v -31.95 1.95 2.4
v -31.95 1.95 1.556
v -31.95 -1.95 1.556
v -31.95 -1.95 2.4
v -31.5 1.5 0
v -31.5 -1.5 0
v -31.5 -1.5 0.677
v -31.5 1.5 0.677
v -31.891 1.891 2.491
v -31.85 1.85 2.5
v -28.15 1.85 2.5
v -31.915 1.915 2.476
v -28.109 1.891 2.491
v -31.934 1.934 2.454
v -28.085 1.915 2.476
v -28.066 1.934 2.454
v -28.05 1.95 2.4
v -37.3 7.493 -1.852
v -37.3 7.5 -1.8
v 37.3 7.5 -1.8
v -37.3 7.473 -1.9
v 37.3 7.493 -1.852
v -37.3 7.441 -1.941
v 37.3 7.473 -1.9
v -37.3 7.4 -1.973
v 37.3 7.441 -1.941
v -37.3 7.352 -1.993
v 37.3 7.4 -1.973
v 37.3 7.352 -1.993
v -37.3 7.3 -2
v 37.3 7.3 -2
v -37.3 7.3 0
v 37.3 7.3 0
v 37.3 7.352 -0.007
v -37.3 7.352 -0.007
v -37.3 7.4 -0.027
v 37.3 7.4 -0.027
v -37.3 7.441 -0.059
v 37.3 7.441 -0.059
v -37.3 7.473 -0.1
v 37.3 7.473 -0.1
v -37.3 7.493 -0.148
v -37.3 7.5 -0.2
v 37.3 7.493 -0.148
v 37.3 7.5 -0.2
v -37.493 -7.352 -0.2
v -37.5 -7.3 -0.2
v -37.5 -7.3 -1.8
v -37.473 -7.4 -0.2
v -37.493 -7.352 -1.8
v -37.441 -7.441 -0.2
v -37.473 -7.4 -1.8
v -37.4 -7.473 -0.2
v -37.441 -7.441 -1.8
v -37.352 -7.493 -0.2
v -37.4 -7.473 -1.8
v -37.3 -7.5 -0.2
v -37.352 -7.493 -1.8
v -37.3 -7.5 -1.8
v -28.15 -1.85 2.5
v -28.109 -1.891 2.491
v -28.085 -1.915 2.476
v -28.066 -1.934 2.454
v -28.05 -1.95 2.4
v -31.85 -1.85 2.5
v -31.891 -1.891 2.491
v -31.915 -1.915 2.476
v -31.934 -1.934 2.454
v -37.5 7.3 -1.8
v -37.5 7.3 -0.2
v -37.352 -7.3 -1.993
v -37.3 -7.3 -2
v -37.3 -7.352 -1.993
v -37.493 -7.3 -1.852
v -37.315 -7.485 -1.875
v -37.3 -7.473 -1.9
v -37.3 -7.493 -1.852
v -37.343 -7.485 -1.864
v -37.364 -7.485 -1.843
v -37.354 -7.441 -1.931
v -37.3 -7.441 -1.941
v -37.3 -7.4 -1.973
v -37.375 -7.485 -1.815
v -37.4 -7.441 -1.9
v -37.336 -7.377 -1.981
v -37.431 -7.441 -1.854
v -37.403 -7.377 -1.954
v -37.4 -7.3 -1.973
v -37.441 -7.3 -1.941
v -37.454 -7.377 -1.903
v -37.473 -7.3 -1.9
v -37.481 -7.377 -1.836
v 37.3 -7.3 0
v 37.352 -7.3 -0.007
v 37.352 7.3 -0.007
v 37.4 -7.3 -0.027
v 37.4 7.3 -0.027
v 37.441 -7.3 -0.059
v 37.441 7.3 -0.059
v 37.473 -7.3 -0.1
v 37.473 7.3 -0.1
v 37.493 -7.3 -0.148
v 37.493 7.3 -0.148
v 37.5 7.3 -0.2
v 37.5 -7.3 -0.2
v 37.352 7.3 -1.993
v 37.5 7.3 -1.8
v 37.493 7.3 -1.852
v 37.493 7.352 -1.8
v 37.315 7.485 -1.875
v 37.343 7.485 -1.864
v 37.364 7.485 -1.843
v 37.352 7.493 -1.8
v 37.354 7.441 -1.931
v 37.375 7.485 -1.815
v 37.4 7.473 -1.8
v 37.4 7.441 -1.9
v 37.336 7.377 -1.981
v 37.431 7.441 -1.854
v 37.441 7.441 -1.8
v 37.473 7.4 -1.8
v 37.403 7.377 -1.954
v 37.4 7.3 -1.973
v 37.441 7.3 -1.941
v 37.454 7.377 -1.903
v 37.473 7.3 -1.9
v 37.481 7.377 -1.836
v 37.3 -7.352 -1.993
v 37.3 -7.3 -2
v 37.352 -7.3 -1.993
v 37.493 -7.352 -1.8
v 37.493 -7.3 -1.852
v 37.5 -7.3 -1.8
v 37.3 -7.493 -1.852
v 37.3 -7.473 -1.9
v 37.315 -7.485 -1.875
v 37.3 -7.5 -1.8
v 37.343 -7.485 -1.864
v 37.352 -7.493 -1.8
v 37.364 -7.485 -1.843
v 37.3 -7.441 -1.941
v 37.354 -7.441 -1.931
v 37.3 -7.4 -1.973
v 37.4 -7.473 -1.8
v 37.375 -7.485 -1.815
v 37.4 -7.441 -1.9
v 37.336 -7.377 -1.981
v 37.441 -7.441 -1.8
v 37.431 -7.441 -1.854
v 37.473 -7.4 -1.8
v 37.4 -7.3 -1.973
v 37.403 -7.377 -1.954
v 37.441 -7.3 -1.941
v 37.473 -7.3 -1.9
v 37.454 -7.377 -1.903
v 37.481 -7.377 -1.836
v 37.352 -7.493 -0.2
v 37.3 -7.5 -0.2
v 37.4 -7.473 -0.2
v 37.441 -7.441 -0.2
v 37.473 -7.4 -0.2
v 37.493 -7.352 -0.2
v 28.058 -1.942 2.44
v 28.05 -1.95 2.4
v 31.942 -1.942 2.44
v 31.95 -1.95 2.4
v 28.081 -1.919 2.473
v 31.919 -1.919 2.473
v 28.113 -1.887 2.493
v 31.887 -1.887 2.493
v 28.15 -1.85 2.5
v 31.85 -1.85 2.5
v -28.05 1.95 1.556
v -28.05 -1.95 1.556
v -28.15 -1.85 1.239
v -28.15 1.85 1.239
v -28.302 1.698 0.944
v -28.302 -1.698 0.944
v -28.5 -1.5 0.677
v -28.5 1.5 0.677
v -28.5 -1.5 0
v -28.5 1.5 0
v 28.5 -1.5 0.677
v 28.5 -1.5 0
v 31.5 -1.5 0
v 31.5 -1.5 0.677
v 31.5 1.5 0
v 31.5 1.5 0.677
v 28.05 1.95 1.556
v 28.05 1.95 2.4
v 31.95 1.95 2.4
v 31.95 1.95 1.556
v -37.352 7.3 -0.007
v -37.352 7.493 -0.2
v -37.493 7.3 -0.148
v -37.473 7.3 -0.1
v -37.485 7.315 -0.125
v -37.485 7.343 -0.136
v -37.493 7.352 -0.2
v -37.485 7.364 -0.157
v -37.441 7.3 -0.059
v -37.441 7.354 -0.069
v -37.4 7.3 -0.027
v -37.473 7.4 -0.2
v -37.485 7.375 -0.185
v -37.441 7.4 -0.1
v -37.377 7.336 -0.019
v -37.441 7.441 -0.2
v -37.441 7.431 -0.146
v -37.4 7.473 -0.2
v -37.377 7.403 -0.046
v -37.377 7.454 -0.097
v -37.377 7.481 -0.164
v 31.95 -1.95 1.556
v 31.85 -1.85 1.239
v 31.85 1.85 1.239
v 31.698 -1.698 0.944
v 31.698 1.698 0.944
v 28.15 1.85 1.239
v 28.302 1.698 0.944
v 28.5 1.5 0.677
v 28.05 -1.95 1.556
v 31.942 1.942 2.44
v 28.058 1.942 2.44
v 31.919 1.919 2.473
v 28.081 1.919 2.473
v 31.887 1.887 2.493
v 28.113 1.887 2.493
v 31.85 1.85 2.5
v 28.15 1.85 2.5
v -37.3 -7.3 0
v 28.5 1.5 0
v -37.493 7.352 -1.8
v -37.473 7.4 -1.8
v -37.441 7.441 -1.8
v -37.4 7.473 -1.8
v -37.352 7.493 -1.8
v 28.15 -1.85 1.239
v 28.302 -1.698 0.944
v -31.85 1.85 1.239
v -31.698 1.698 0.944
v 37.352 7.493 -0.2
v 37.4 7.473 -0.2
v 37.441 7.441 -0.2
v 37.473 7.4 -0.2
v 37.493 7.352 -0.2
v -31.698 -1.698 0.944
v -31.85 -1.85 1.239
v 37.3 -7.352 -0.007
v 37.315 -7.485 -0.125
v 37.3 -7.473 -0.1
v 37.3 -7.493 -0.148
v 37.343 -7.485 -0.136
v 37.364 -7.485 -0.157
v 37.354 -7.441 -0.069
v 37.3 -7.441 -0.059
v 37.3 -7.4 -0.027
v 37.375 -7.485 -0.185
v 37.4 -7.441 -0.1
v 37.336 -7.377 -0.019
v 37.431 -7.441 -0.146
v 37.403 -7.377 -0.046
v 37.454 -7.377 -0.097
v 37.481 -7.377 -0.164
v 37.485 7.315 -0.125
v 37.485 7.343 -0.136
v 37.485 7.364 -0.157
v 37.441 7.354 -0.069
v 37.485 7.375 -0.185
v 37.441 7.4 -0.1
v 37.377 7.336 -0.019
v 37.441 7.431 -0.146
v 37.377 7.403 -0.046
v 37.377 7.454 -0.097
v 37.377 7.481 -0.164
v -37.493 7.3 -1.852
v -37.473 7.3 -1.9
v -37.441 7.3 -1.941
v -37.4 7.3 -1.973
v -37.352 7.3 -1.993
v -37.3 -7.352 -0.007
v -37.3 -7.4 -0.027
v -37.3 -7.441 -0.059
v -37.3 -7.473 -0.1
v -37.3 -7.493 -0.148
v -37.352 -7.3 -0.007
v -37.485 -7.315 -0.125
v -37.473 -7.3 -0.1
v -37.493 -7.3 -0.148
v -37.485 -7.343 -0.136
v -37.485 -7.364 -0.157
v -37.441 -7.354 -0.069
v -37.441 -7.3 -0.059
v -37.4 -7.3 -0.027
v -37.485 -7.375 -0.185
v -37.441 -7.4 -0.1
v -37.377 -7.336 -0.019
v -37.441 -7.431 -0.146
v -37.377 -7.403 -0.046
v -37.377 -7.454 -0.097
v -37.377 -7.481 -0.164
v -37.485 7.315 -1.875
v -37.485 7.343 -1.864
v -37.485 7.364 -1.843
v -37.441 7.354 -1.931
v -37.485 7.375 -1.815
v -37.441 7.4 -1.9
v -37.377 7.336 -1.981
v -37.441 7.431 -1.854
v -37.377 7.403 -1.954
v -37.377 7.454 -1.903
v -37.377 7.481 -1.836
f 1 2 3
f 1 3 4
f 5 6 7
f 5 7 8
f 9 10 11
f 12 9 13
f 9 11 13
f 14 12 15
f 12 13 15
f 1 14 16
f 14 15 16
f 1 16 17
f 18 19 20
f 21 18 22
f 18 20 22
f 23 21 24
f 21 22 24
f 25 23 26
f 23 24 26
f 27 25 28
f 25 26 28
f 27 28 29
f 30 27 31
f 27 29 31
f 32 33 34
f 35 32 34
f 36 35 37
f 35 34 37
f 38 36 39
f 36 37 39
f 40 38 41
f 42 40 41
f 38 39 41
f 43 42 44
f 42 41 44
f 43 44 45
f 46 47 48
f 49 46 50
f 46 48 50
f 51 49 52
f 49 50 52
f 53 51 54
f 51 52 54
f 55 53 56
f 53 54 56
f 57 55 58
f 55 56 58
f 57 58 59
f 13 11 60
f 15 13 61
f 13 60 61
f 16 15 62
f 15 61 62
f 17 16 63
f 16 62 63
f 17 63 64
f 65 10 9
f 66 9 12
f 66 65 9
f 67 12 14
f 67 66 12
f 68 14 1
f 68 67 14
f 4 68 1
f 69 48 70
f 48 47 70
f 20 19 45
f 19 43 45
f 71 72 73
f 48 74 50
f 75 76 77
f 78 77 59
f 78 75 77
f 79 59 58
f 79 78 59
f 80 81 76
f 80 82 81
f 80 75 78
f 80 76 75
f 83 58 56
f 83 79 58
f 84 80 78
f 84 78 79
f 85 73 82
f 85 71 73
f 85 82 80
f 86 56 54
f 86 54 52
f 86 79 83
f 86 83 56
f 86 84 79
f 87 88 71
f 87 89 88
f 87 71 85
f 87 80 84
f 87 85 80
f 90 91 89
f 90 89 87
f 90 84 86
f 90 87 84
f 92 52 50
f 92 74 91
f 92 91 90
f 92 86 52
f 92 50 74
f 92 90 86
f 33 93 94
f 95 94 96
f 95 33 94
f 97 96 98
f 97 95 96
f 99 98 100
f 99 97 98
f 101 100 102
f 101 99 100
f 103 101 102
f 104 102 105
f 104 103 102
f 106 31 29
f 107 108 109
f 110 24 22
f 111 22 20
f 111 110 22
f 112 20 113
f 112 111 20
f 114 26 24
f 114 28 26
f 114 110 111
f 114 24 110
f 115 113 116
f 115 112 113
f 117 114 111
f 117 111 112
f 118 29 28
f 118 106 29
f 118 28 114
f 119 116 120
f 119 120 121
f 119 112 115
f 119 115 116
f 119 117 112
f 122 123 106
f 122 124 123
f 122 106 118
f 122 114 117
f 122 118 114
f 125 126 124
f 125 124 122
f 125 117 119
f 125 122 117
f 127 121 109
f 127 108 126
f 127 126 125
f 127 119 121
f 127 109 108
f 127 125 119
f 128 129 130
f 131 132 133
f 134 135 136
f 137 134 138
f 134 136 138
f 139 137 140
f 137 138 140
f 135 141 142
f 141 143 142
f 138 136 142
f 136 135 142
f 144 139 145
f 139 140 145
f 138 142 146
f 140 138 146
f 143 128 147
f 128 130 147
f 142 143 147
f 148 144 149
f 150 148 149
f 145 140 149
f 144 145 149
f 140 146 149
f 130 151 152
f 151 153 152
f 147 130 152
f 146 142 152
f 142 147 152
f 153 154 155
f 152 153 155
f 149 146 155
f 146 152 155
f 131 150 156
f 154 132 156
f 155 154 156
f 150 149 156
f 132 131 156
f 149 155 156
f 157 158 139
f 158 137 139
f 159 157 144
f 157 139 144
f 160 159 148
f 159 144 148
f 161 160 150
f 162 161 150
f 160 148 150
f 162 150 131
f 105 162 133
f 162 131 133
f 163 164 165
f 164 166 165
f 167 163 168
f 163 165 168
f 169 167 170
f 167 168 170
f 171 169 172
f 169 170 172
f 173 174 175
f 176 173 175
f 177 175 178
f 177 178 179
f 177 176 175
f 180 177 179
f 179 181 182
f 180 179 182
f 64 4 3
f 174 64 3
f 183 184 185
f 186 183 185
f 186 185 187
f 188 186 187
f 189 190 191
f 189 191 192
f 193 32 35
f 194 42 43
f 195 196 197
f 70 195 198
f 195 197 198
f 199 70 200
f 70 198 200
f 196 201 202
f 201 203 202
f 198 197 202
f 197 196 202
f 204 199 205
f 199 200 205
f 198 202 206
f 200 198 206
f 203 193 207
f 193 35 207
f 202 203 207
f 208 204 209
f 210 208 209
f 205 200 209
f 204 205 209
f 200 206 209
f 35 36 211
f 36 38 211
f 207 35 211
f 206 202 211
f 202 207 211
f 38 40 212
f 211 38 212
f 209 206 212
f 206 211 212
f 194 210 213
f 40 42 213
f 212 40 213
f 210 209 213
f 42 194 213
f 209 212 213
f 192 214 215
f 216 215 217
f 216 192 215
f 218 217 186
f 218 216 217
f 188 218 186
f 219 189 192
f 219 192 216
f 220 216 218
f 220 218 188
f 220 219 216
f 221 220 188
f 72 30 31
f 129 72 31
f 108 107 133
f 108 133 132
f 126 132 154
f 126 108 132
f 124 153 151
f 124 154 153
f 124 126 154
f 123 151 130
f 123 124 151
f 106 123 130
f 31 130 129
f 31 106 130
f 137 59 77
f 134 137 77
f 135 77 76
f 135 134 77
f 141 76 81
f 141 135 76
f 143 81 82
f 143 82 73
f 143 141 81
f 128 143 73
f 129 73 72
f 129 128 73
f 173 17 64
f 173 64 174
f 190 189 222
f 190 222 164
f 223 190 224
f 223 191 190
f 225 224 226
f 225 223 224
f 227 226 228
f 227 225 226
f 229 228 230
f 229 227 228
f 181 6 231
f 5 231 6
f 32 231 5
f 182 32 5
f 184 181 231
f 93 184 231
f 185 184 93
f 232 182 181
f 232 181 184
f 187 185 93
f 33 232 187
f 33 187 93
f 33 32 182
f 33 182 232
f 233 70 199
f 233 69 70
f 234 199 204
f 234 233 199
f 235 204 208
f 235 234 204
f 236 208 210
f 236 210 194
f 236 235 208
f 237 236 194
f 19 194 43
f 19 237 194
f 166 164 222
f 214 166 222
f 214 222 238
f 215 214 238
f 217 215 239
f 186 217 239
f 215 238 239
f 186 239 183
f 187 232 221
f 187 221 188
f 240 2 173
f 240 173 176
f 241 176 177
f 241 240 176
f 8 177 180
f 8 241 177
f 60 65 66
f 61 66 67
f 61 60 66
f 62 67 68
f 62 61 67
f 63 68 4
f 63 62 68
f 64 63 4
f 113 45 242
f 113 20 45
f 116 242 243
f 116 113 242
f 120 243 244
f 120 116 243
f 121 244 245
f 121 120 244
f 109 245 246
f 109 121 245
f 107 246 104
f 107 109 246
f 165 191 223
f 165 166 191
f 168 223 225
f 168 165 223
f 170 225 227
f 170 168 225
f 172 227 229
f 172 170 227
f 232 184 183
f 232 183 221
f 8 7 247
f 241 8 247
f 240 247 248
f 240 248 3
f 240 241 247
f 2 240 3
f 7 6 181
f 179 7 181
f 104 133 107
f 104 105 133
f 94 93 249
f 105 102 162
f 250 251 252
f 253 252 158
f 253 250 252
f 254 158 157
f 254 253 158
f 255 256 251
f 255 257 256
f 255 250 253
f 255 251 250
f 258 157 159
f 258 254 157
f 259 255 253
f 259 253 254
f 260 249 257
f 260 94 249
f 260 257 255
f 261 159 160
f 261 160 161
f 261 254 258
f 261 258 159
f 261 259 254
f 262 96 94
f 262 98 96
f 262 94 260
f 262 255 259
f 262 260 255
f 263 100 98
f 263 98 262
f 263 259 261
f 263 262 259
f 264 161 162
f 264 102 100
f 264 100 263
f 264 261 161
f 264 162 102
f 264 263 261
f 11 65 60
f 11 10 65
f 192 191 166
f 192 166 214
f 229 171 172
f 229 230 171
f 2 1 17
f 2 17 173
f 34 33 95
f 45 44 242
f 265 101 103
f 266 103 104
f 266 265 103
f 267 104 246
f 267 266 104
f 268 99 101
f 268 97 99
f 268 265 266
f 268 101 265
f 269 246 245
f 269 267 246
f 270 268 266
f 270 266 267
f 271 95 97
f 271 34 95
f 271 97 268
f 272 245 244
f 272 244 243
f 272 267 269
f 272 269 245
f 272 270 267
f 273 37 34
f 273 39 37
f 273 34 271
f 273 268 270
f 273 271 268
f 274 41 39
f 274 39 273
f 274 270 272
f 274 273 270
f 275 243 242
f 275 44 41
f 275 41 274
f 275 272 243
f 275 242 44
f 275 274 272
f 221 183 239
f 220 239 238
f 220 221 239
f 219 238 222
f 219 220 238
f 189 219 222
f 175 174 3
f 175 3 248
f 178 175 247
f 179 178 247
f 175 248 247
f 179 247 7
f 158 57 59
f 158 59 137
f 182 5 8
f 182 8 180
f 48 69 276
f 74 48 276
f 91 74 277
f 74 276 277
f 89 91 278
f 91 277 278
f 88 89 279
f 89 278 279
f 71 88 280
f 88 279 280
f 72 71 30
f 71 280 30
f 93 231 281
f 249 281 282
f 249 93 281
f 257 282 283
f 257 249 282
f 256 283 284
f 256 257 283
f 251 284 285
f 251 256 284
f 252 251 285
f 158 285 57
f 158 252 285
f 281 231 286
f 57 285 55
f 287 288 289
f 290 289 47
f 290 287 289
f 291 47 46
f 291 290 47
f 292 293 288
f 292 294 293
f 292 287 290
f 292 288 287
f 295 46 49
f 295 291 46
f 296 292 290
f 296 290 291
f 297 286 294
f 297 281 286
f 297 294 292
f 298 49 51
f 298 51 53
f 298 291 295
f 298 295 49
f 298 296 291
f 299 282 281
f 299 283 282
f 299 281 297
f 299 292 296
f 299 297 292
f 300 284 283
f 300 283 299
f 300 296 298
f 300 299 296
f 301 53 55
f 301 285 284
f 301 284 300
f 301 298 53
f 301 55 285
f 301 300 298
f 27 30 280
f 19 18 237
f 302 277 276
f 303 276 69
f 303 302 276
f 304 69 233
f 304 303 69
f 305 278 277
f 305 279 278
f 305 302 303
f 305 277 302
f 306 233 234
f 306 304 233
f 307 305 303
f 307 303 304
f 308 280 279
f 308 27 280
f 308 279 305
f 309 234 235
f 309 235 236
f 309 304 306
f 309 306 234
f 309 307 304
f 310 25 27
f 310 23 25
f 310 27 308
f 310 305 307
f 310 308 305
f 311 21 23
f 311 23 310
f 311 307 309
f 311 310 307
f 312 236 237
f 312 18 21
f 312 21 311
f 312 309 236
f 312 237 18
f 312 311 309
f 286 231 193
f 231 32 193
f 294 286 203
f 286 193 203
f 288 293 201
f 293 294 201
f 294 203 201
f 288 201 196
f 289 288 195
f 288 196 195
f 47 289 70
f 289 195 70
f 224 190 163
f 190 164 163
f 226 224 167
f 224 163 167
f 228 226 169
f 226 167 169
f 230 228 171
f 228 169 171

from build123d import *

# Parameters (mm, degrees)
SKETCH_1_W           = 75
SKETCH_1_H           = 15
EXTRUDE_1_DEPTH      = 2
SKETCH_2_W           = 3
SKETCH_2_H           = 3
EXTRUDE_2_DEPTH      = 1
EXTRUDE_3_DEPTH      = 2
EXTRUDE_3_DEPTH_BACK = 2
CUT_EXTRUDE_1_DEPTH  = 70.898515721
FILLET_1_R           = 0.1
FILLET_2_R           = 0.2


with BuildPart() as part:
    # 草图1 → 凸台-拉伸1 (new body)
    with BuildSketch(Plane.XY):
        Rectangle(SKETCH_1_W, SKETCH_1_H)
    extrude(amount=-EXTRUDE_1_DEPTH)

    # 草图2 → 凸台-拉伸2 (add)
    with BuildSketch(Plane.XY):
        with Locations((-30, 0)):
            Rectangle(SKETCH_2_W, SKETCH_2_H)
        with Locations((30, 0)):
            Rectangle(SKETCH_2_W, SKETCH_2_H)
    extrude(amount=EXTRUDE_2_DEPTH)

    # 草图3 → 凸台-拉伸3 (add, two sides: drawn at the far end of the back side and taken through both)
    with BuildSketch(Plane.XZ.offset(-EXTRUDE_3_DEPTH_BACK)):
        with BuildLine():
            Line((-31.95, 2.5), (-28.05, 2.5))
            Line((-28.05, 2.5), (-28.05, 1.555590279))
            ThreePointArc((-28.05, 1.555590279), (-28.219957697, 1.088161527), (-28.5, 0.677124344))
            Line((-28.5, 0.677124344), (-31.5, 0.677124344))
            ThreePointArc((-31.5, 0.677124344), (-31.780042303, 1.088161527), (-31.95, 1.555590279))
            Line((-31.95, 1.555590279), (-31.95, 2.5))
        make_face()
        with BuildLine():
            Line((31.5, 0.677124344), (28.5, 0.677124344))
            ThreePointArc((28.5, 0.677124344), (28.219957697, 1.088161527), (28.05, 1.555590279))
            Line((28.05, 1.555590279), (28.05, 2.5))
            Line((28.05, 2.5), (31.95, 2.5))
            Line((31.95, 2.5), (31.95, 1.555590279))
            ThreePointArc((31.95, 1.555590279), (31.780042303, 1.088161527), (31.5, 0.677124344))
        make_face()
    extrude(amount=EXTRUDE_3_DEPTH + EXTRUDE_3_DEPTH_BACK)

    # 草图4 → 切除-拉伸1 (cut, through all)
    with BuildSketch(Plane.ZY.offset(31.95)):
        with BuildLine():
            Line((2.5, 1.95), (1.555590279, 1.95))
            ThreePointArc((1.555590279, 1.95), (1.088161527, 1.780042303), (0.677124344, 1.5))
            Line((0.677124344, 1.5), (0.677124344, 2))
            Line((0.677124344, 2), (2.5, 2))
            Line((2.5, 2), (2.5, 1.95))
        make_face()
        with BuildLine():
            Line((0.677124344, -2), (2.5, -2))
            Line((2.5, -2), (2.5, -1.95))
            Line((2.5, -1.95), (1.555590279, -1.95))
            ThreePointArc((1.555590279, -1.95), (1.088161527, -1.780042303), (0.677124344, -1.5))
            Line((0.677124344, -1.5), (0.677124344, -2))
        make_face()
    extrude(amount=-CUT_EXTRUDE_1_DEPTH, mode=Mode.SUBTRACT)

    # 圆角1
    fillet_1_edges = [part.edges().sort_by_distance(p)[0] for p in [
        (-30, -1.95, 2.5),
        (30, -1.95, 2.5),
        (31.95, 0, 2.5),
        (28.05, 0, 2.5),
        (-28.05, 0, 2.5),
        (-31.95, 0, 2.5),
        (-30, 1.95, 2.5),
        (30, 1.95, 2.5),
    ]]
    fillet(fillet_1_edges, radius=FILLET_1_R)

    # 圆角2
    fillet_2_edges = [part.edges().sort_by_distance(p)[0] for p in [
        (37.5, 0, -2),
        (0, 7.5, -2),
        (-37.5, 0, -2),
        (0, 7.5, 0),
        (37.5, 0, 0),
        (0, -7.5, 0),
        (-37.5, 0, 0),
        (0, -7.5, -2),
        (-37.5, 7.5, -1),
        (37.5, 7.5, -1),
        (37.5, -7.5, -1),
        (-37.5, -7.5, -1),
    ]]
    fillet(fillet_2_edges, radius=FILLET_2_R)


solid = part.part
